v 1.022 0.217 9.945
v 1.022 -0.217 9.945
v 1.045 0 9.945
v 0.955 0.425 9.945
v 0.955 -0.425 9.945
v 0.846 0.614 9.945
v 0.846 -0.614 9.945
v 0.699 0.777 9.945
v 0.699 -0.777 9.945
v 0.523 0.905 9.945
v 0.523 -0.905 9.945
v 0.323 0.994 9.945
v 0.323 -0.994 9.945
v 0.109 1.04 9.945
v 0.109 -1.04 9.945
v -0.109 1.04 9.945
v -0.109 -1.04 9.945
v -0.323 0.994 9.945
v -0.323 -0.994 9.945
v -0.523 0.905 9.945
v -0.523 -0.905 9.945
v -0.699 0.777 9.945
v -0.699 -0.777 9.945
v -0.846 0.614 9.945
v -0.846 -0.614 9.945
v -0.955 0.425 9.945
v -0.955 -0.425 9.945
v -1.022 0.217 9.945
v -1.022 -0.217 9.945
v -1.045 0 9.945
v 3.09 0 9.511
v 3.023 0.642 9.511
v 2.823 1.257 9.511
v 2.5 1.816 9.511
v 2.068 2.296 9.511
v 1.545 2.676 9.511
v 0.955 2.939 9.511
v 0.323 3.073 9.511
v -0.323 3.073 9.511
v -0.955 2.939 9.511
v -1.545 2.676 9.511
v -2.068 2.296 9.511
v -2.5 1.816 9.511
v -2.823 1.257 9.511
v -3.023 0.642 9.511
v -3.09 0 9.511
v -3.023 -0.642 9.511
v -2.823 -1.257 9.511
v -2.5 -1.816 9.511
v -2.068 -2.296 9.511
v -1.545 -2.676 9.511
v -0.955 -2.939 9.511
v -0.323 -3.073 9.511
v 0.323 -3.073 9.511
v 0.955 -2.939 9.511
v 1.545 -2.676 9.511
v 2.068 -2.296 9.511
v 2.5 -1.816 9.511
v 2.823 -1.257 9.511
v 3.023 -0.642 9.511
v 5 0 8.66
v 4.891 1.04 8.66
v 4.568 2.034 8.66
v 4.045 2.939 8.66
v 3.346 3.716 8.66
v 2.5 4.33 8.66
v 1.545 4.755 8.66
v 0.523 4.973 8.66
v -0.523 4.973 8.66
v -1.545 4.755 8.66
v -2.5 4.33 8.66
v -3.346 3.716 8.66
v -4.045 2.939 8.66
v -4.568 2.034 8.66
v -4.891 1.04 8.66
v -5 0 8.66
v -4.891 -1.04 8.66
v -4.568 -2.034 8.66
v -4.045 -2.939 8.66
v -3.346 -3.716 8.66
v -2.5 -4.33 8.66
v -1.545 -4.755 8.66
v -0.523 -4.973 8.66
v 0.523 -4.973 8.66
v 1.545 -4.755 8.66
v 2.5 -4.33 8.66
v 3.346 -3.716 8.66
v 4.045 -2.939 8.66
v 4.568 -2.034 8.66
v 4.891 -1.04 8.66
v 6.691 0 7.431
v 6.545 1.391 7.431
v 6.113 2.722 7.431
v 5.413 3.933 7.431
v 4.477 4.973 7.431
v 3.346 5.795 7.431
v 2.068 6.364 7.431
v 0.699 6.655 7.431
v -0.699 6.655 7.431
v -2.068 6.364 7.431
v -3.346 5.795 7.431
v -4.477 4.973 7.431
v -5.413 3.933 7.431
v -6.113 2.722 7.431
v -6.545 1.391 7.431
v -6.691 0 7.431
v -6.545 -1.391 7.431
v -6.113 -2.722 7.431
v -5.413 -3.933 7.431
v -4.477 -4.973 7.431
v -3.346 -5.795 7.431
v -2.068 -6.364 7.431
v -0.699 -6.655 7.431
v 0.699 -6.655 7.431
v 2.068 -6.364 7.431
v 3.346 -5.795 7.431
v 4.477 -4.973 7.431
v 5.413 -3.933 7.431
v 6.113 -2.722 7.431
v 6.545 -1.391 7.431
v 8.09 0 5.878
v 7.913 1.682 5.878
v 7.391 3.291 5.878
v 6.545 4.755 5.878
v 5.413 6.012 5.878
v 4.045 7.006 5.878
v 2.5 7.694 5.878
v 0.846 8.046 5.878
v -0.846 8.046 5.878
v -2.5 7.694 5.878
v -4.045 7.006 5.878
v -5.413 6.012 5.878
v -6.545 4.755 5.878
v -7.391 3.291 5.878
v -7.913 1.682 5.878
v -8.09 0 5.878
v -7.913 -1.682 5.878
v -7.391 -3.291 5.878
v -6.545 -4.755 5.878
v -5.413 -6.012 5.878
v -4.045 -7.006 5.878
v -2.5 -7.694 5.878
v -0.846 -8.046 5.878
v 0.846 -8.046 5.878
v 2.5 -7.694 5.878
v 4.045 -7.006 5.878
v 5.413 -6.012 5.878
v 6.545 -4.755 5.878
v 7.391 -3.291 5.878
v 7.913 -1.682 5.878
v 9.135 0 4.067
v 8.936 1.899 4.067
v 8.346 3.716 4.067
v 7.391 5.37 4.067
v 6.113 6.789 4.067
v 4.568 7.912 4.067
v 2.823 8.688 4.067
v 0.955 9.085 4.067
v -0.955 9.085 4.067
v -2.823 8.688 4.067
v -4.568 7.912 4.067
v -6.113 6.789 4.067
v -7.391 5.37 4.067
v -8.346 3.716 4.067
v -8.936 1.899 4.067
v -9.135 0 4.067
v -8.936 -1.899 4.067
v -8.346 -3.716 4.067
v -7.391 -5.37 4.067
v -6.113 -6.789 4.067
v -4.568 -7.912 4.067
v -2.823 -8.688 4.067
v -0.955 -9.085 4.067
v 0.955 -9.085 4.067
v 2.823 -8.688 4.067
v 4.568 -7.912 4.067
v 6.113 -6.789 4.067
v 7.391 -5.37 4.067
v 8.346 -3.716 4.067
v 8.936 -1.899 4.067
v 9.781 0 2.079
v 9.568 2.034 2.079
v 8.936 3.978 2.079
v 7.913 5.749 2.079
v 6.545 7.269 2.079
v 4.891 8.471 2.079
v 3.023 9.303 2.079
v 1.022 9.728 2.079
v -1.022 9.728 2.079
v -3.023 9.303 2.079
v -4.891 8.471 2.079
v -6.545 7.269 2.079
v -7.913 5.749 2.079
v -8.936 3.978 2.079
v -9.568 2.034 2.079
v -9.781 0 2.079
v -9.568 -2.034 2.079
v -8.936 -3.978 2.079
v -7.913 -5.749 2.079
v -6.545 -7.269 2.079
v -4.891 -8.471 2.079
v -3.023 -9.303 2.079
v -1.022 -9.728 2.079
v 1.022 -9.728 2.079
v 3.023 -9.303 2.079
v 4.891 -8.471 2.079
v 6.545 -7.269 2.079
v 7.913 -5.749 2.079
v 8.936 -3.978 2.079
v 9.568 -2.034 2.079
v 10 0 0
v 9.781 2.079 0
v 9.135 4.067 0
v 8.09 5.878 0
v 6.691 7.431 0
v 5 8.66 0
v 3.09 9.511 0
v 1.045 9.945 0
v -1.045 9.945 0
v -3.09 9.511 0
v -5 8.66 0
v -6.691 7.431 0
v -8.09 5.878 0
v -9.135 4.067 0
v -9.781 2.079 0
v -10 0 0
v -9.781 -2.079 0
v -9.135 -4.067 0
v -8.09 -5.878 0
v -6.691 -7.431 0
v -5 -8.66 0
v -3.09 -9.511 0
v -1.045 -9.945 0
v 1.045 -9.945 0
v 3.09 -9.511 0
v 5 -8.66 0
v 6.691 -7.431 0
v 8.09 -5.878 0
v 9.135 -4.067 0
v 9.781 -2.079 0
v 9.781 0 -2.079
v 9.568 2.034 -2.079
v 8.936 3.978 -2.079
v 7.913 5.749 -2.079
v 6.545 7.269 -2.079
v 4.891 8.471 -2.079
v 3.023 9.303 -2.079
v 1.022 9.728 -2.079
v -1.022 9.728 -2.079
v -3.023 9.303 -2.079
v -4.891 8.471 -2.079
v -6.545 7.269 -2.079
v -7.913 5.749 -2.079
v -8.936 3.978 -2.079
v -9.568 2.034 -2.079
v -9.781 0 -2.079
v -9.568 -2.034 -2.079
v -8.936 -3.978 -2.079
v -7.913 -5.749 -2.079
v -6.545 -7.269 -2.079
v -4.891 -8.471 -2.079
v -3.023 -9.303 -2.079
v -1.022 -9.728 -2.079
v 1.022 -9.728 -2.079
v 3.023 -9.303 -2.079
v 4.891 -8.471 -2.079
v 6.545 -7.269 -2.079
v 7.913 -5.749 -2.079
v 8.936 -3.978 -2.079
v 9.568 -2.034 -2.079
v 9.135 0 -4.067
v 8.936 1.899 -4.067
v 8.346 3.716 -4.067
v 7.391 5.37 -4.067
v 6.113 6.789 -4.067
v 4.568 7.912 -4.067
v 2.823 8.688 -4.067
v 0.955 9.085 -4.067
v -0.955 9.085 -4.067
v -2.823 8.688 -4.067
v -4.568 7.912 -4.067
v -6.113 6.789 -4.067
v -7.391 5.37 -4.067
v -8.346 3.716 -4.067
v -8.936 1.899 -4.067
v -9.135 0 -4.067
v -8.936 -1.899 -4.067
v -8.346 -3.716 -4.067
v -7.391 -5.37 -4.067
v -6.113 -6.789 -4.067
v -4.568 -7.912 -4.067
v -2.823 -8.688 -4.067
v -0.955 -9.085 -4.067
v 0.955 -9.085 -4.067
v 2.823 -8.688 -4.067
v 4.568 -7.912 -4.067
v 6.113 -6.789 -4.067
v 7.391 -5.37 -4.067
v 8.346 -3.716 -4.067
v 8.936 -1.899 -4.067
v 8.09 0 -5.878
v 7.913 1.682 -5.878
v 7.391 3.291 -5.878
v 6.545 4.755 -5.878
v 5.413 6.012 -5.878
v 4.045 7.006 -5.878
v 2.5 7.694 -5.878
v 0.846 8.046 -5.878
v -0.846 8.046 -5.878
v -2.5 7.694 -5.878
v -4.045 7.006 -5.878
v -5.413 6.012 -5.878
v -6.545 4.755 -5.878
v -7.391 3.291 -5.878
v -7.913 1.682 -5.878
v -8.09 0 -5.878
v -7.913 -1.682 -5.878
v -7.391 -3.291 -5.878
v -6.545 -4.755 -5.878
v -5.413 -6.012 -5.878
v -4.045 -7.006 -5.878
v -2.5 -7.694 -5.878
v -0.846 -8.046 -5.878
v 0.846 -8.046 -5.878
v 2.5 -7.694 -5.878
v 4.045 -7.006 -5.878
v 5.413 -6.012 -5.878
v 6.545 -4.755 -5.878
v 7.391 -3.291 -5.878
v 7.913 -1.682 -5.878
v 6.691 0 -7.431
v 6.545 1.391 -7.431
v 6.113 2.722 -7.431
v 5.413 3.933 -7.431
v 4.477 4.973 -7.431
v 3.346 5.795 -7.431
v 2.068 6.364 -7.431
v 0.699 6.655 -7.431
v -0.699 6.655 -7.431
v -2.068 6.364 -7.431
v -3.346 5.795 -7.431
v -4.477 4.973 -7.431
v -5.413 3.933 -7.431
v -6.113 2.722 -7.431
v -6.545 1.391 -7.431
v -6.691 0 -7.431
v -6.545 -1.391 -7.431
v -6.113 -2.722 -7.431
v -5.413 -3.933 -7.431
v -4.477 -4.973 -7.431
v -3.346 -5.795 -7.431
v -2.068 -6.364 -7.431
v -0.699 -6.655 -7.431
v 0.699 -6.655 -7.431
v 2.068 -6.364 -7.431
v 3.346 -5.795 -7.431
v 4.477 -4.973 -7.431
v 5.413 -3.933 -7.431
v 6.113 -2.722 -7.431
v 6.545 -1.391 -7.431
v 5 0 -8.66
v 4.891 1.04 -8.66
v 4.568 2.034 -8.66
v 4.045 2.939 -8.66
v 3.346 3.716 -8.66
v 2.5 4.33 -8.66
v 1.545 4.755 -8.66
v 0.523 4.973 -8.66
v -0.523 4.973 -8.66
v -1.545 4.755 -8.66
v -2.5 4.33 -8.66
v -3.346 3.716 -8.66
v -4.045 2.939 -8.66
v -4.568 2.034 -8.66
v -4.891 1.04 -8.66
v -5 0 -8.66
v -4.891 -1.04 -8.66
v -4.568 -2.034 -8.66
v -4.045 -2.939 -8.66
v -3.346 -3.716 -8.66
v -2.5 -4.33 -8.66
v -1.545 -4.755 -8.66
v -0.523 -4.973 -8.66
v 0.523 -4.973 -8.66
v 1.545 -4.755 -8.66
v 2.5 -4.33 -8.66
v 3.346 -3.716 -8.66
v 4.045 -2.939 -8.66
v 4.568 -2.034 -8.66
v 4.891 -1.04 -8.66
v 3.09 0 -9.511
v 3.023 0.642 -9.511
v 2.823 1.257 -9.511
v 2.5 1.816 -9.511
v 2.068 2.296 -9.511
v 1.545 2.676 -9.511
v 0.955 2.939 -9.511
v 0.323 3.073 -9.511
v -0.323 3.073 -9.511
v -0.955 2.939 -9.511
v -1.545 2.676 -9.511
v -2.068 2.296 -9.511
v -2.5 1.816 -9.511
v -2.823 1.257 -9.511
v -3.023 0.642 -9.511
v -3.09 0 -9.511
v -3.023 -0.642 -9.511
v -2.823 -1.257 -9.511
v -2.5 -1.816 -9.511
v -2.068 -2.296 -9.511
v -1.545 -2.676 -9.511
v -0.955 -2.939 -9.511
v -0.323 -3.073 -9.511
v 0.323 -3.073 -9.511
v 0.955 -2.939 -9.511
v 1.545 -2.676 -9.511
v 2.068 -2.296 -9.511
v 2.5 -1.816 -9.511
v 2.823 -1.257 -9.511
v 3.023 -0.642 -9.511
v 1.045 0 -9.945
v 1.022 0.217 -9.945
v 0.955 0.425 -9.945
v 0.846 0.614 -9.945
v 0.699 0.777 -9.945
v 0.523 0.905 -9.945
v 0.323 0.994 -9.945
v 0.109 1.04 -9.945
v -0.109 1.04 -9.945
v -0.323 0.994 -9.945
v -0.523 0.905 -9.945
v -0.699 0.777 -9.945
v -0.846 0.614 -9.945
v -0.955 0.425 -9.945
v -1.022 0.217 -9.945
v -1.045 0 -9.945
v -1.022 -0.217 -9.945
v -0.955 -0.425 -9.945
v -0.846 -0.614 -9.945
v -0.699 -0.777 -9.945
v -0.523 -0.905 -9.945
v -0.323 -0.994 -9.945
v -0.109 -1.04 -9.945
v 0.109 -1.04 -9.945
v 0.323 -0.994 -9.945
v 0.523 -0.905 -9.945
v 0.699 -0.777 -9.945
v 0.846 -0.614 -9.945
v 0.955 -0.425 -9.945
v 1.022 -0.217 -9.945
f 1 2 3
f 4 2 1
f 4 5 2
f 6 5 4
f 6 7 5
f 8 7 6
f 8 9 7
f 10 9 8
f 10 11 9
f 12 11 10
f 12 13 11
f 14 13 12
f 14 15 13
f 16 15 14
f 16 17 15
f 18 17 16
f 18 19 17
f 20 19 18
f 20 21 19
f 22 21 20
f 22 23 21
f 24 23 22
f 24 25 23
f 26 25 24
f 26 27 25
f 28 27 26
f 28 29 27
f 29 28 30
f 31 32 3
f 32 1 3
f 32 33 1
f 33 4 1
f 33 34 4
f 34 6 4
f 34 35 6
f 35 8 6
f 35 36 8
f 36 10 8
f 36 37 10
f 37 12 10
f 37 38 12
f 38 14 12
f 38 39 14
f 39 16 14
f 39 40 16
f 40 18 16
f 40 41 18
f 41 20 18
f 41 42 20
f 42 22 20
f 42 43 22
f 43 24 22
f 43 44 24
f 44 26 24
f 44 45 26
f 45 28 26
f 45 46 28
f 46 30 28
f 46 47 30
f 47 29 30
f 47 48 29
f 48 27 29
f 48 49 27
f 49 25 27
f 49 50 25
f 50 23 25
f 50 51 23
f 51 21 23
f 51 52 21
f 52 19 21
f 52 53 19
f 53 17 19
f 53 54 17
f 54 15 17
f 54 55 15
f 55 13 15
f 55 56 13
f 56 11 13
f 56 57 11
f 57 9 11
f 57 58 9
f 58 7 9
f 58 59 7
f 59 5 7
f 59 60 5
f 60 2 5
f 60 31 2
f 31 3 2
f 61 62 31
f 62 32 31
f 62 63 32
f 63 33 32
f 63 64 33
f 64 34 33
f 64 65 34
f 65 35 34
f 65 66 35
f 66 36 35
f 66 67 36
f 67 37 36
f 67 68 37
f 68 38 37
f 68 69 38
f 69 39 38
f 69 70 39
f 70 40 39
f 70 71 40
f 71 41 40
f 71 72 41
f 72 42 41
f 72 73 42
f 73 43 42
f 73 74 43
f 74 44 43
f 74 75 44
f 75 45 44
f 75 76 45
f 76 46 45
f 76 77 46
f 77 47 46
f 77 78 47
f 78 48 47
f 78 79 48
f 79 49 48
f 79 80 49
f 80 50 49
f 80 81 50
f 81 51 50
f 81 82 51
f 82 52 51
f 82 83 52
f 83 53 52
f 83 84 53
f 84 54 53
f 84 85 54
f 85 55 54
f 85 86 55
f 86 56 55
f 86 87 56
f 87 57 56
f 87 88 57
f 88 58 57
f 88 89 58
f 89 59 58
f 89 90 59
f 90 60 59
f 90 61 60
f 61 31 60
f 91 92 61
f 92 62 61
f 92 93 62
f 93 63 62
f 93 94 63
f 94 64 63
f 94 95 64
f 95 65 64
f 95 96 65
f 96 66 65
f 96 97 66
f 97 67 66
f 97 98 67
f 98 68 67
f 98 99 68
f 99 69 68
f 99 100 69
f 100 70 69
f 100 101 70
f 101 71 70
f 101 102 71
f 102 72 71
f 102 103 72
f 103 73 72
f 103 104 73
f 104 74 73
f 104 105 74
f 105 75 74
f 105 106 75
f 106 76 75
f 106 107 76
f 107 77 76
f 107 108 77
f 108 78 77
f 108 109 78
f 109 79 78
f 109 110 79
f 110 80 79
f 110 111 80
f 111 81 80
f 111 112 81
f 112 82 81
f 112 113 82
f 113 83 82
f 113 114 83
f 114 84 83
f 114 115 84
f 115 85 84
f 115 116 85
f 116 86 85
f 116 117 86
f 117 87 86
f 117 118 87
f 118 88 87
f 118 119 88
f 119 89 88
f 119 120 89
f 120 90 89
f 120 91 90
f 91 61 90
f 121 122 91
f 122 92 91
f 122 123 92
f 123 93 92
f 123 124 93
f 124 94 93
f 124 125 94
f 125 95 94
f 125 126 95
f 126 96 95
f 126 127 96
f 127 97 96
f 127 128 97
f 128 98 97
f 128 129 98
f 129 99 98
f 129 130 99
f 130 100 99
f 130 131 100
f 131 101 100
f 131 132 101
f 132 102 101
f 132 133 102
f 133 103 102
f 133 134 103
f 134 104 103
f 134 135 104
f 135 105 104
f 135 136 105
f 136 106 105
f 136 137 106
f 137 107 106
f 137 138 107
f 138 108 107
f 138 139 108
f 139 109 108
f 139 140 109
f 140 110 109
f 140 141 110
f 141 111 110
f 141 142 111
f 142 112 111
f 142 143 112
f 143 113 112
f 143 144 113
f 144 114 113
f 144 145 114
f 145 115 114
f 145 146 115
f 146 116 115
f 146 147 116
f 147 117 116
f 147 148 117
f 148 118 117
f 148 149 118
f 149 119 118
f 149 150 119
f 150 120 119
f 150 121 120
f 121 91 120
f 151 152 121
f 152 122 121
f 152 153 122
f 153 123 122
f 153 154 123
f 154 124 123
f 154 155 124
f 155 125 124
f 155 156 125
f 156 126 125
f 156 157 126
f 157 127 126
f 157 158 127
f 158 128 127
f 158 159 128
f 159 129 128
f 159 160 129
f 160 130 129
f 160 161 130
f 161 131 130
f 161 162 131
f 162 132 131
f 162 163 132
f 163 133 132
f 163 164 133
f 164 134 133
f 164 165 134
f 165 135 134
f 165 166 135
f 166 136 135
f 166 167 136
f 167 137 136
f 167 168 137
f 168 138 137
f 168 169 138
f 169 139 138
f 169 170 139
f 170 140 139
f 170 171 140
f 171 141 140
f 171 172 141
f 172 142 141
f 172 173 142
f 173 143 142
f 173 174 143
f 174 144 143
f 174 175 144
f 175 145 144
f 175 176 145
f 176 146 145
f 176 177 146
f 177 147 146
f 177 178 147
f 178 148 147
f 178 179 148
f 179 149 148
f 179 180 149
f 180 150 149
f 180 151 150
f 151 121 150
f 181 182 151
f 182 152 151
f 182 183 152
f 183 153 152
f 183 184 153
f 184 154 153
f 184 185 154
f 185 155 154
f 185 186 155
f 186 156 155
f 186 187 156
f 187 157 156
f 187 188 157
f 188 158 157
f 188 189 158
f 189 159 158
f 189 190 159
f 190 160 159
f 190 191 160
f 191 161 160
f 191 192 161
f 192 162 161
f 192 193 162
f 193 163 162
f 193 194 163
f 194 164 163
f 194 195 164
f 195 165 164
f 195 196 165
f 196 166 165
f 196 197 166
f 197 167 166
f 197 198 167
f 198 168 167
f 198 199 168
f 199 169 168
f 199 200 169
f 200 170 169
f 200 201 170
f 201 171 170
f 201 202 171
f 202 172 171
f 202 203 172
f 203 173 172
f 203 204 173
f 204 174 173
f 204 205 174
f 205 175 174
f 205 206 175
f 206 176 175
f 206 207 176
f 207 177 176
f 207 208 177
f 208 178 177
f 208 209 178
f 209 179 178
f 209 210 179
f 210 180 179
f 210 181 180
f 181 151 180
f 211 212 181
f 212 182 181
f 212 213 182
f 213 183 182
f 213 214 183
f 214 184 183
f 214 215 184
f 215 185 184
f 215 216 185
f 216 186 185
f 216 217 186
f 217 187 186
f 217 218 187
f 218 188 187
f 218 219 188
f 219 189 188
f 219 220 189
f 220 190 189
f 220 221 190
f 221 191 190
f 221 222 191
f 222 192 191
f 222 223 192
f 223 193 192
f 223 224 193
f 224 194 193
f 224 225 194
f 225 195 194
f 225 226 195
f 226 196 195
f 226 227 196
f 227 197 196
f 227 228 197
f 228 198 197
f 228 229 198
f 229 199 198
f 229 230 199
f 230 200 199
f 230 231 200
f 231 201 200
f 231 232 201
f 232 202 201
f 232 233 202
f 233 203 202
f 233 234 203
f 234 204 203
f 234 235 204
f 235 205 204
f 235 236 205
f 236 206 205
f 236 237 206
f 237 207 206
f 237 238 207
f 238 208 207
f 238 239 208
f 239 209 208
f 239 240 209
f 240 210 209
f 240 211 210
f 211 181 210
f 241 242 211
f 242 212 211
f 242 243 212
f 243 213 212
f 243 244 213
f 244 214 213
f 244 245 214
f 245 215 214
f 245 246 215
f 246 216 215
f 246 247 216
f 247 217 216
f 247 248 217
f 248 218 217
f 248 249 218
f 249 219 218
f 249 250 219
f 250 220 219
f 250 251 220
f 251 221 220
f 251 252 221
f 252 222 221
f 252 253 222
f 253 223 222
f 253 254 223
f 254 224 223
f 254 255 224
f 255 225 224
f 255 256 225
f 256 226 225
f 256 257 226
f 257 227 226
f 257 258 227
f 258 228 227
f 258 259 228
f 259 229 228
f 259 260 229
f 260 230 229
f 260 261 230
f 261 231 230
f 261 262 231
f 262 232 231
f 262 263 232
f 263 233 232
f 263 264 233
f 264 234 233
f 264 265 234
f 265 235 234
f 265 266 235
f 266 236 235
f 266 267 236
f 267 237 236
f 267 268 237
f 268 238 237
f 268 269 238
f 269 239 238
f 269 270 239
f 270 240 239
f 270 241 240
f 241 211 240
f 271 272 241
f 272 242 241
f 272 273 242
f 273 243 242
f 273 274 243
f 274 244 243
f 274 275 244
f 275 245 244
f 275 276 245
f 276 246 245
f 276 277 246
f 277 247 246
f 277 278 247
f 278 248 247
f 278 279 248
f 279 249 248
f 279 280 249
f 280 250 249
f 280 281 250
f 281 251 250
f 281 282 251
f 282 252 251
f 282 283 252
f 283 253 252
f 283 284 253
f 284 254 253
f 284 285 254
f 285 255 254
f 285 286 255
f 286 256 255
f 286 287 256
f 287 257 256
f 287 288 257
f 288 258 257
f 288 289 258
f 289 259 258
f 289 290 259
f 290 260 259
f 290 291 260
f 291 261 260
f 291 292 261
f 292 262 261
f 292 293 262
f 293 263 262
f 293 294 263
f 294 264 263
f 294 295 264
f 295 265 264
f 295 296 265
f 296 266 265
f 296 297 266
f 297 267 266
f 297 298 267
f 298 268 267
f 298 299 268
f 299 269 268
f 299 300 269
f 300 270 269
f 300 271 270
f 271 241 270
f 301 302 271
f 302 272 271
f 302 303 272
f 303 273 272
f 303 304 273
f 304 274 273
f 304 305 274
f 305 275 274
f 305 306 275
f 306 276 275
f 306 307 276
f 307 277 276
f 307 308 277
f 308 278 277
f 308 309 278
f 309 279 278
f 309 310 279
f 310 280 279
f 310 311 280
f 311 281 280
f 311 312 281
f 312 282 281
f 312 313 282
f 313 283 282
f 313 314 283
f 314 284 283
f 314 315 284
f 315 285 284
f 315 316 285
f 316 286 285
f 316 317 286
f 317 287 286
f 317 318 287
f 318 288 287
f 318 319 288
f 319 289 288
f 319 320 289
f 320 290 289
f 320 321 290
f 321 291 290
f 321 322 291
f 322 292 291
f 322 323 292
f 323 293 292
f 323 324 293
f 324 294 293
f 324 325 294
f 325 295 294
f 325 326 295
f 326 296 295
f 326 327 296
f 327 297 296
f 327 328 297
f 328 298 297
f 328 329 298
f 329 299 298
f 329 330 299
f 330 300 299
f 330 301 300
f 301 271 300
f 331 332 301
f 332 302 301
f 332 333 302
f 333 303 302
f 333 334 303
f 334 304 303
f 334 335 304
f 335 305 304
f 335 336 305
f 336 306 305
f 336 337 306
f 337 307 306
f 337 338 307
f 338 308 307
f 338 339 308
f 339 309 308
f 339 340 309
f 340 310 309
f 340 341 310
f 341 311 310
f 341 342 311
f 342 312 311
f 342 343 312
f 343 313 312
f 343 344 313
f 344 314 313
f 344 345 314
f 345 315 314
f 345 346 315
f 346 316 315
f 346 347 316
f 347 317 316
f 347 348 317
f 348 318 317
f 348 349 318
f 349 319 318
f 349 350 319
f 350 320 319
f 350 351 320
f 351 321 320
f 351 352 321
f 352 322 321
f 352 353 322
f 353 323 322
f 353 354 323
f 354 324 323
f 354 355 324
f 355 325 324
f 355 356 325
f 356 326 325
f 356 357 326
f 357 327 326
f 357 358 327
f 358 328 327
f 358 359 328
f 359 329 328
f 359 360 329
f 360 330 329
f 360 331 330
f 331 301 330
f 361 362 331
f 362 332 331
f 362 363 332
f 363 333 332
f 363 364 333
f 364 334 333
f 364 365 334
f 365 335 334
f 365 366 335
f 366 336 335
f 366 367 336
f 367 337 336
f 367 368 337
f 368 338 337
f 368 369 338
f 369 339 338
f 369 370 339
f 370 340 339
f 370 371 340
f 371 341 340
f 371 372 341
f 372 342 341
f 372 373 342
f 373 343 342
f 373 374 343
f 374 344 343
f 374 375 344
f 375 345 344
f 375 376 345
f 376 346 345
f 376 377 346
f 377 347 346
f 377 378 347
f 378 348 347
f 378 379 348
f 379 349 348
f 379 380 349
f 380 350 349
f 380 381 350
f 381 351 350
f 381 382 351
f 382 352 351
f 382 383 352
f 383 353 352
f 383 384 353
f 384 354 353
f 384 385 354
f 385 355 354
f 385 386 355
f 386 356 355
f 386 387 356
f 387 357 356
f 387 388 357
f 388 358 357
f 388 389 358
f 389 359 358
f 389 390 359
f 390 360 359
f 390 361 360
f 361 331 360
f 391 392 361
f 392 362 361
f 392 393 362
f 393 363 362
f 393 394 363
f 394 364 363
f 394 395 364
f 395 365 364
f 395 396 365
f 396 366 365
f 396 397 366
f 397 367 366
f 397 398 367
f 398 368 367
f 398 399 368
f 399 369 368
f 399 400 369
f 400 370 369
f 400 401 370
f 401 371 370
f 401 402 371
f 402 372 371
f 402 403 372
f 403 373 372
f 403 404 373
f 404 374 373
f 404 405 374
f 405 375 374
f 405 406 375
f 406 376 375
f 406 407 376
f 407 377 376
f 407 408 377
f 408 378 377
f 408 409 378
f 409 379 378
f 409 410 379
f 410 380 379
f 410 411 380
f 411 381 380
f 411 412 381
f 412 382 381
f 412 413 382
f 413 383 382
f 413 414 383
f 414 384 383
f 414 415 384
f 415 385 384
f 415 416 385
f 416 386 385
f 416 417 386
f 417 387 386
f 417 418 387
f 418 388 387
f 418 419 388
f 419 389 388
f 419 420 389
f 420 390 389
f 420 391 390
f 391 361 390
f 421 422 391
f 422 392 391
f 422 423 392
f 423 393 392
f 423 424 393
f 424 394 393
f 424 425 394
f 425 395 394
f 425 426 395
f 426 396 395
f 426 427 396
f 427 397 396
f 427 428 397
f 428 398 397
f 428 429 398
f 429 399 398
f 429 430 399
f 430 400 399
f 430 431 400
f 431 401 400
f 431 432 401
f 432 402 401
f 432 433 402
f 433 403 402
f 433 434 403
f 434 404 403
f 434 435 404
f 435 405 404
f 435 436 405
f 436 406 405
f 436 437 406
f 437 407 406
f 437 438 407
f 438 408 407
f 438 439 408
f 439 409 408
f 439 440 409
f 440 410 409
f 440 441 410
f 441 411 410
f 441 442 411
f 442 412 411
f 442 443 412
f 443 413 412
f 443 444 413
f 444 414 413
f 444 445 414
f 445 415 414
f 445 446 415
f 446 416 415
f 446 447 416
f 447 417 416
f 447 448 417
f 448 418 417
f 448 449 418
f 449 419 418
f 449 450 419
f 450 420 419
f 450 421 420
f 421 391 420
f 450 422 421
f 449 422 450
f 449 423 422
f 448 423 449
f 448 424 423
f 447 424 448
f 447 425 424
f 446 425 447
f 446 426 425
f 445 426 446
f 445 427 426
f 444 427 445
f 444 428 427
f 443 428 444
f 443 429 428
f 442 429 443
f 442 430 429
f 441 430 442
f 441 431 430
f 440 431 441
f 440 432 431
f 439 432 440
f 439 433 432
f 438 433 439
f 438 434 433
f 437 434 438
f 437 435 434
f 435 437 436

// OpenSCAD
function s() = 20;

module used(r) {
  color("Green") sphere(r);
}

used(10);
